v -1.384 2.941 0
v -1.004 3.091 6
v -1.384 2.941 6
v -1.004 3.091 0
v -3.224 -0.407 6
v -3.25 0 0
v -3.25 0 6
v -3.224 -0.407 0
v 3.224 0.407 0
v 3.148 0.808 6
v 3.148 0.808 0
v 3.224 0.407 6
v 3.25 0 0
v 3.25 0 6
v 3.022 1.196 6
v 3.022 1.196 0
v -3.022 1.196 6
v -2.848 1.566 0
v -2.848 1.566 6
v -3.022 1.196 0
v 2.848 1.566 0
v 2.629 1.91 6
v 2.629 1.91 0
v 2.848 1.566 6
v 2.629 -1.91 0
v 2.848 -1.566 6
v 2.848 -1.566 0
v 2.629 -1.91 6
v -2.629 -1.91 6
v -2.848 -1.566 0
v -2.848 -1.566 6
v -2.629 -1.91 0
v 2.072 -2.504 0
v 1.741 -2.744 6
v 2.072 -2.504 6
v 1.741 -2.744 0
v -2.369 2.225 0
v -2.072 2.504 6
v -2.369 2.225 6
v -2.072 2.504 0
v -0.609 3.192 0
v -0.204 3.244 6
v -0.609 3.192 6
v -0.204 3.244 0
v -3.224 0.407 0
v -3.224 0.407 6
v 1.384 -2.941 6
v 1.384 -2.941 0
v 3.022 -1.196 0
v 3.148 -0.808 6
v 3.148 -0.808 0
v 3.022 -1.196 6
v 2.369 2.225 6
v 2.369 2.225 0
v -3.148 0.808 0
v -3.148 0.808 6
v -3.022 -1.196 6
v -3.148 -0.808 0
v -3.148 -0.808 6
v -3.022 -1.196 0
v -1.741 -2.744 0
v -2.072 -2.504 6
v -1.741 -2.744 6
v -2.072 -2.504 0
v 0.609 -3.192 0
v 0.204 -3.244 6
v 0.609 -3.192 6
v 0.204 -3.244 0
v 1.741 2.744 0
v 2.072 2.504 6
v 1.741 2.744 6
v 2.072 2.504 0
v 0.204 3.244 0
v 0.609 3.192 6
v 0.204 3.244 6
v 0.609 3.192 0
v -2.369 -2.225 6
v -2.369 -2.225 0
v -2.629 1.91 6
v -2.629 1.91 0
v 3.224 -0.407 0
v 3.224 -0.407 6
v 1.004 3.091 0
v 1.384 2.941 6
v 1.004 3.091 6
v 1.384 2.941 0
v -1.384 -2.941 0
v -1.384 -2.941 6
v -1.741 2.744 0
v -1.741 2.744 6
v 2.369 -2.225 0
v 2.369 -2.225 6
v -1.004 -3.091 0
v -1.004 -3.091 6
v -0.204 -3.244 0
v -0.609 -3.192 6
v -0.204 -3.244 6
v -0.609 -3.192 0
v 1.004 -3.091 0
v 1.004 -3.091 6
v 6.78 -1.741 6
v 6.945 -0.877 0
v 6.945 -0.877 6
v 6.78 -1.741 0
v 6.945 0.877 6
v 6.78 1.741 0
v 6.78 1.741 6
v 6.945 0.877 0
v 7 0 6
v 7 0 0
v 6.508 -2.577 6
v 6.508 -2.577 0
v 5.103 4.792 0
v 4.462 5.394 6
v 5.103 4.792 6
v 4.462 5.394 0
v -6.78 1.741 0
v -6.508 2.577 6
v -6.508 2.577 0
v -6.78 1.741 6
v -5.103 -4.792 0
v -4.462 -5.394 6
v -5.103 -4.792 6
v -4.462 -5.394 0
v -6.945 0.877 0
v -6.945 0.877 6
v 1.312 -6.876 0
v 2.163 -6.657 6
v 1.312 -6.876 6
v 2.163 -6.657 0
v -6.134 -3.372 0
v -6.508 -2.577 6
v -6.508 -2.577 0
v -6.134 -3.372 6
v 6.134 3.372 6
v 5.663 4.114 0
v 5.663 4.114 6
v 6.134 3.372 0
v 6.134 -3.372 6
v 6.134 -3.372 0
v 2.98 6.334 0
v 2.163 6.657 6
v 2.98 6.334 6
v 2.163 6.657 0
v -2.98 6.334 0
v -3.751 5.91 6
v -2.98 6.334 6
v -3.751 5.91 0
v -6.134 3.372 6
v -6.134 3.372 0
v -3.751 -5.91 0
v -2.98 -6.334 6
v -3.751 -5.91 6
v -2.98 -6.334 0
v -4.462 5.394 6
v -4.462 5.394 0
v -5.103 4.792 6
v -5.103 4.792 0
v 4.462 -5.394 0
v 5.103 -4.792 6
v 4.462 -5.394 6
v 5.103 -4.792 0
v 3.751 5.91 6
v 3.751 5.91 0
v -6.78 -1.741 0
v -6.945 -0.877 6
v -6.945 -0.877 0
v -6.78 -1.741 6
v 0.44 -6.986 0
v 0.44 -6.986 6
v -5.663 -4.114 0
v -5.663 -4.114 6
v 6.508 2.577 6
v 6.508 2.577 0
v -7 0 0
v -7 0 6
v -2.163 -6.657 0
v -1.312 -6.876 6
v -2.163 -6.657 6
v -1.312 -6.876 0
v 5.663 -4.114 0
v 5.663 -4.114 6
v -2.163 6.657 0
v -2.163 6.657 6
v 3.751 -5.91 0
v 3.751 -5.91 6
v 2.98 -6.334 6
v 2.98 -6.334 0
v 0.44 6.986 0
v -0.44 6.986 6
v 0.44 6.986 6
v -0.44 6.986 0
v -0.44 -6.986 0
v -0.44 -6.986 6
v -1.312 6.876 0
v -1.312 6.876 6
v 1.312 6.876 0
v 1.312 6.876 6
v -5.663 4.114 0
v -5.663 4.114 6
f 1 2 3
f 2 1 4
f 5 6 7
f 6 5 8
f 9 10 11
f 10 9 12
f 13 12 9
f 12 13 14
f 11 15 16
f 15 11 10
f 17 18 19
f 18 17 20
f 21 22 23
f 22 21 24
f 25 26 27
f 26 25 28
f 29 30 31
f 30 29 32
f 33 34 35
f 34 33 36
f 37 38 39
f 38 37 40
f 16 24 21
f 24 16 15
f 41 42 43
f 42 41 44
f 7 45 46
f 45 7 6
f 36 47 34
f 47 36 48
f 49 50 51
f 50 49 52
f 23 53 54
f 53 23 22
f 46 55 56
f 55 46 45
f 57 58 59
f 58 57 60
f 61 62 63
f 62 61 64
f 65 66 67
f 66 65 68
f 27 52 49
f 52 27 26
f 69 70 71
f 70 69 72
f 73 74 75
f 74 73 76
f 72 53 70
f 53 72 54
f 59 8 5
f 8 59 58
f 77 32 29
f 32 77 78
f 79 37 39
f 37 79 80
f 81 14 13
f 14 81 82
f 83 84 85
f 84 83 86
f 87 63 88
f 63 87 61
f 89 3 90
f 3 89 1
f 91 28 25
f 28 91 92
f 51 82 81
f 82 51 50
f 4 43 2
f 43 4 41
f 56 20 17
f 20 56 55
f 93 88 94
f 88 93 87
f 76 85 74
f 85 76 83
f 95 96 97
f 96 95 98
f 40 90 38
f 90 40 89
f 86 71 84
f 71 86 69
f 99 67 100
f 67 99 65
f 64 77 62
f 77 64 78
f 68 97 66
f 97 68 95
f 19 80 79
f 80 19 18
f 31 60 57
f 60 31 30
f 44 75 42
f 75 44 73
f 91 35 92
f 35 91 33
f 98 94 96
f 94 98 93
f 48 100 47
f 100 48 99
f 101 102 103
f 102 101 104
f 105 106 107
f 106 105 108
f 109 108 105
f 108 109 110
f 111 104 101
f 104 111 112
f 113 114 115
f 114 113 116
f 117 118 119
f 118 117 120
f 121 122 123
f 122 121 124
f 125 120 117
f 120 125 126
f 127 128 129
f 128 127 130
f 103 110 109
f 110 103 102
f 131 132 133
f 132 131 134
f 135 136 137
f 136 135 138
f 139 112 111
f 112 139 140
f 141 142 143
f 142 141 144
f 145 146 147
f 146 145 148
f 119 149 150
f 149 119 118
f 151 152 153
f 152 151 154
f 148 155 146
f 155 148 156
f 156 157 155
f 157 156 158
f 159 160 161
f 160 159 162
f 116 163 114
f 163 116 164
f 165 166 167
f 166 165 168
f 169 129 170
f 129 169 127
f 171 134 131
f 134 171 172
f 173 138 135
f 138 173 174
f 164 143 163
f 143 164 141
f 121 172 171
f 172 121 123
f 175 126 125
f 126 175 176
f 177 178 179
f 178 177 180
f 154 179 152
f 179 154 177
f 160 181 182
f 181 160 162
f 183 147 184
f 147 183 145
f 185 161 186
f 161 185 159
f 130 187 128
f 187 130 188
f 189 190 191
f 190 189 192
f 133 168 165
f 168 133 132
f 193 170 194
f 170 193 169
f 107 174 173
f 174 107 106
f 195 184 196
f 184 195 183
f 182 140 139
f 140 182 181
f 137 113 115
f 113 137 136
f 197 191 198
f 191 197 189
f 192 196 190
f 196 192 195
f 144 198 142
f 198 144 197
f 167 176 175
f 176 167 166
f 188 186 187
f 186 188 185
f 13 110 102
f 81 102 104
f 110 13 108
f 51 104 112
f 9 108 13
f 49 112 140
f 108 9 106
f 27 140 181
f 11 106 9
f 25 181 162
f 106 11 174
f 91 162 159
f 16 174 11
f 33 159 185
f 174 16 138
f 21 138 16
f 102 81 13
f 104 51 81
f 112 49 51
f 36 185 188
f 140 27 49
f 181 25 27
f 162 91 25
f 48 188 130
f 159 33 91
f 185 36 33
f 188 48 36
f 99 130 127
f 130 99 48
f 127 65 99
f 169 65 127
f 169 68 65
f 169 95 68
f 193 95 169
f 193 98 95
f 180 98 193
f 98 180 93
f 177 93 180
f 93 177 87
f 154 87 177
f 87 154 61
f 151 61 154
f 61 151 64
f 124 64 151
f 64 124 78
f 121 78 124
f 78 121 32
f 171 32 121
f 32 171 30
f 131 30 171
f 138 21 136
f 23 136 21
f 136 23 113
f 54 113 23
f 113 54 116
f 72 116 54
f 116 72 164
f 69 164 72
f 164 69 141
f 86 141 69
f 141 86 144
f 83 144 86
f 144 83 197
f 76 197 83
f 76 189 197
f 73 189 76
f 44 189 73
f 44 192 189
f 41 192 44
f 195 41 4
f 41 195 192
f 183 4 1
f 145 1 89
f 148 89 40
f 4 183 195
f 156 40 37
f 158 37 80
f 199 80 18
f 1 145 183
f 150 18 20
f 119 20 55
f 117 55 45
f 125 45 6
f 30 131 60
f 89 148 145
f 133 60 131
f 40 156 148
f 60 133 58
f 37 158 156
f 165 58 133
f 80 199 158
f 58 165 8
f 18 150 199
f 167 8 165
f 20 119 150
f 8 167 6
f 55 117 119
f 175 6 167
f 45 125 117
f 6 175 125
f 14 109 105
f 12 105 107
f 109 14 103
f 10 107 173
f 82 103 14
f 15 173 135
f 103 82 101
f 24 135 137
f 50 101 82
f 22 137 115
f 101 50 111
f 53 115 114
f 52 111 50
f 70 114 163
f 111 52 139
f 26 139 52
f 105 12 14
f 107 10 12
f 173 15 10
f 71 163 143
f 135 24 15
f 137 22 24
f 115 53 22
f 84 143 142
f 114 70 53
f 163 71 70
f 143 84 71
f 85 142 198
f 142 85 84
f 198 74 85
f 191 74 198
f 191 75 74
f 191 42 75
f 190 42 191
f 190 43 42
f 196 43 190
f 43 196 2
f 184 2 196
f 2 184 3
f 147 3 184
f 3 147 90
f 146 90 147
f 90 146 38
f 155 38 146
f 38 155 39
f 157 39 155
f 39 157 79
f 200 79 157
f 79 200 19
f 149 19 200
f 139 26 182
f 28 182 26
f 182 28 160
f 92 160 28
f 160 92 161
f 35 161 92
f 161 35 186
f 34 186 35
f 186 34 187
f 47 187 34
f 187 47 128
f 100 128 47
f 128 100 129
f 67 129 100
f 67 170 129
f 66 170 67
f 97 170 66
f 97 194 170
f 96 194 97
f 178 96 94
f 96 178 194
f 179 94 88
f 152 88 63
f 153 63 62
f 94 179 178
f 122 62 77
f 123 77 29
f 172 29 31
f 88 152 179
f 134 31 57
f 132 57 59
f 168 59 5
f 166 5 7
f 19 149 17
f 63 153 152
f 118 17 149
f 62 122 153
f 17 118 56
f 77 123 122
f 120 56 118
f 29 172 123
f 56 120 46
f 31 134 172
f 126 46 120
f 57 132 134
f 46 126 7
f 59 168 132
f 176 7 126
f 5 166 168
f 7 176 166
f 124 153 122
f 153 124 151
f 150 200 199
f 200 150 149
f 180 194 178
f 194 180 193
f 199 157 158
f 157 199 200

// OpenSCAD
$fn = 50;


difference() {
	union() {
		cylinder(h = 6, r = 7.0000000000);
	}
	union() {
		#translate(v = [0.0000000000, 0.0000000000, -100.0000000000]) {
			cylinder(h = 200, r = 3.2500000000);
		}
		#translate(v = [0.0000000000, 0.0000000000, -100.0000000000]) {
			cylinder(h = 200, r = 3.2500000000);
		}
		#translate(v = [0.0000000000, 0.0000000000, -100.0000000000]) {
			cylinder(h = 200, r = 3.2500000000);
		}
		#translate(v = [0.0000000000, 0.0000000000, -100.0000000000]) {
			cylinder(h = 200, r = 3.2500000000);
		}
		#cylinder(h = 6, r = 2.0000000000);
	}
}
